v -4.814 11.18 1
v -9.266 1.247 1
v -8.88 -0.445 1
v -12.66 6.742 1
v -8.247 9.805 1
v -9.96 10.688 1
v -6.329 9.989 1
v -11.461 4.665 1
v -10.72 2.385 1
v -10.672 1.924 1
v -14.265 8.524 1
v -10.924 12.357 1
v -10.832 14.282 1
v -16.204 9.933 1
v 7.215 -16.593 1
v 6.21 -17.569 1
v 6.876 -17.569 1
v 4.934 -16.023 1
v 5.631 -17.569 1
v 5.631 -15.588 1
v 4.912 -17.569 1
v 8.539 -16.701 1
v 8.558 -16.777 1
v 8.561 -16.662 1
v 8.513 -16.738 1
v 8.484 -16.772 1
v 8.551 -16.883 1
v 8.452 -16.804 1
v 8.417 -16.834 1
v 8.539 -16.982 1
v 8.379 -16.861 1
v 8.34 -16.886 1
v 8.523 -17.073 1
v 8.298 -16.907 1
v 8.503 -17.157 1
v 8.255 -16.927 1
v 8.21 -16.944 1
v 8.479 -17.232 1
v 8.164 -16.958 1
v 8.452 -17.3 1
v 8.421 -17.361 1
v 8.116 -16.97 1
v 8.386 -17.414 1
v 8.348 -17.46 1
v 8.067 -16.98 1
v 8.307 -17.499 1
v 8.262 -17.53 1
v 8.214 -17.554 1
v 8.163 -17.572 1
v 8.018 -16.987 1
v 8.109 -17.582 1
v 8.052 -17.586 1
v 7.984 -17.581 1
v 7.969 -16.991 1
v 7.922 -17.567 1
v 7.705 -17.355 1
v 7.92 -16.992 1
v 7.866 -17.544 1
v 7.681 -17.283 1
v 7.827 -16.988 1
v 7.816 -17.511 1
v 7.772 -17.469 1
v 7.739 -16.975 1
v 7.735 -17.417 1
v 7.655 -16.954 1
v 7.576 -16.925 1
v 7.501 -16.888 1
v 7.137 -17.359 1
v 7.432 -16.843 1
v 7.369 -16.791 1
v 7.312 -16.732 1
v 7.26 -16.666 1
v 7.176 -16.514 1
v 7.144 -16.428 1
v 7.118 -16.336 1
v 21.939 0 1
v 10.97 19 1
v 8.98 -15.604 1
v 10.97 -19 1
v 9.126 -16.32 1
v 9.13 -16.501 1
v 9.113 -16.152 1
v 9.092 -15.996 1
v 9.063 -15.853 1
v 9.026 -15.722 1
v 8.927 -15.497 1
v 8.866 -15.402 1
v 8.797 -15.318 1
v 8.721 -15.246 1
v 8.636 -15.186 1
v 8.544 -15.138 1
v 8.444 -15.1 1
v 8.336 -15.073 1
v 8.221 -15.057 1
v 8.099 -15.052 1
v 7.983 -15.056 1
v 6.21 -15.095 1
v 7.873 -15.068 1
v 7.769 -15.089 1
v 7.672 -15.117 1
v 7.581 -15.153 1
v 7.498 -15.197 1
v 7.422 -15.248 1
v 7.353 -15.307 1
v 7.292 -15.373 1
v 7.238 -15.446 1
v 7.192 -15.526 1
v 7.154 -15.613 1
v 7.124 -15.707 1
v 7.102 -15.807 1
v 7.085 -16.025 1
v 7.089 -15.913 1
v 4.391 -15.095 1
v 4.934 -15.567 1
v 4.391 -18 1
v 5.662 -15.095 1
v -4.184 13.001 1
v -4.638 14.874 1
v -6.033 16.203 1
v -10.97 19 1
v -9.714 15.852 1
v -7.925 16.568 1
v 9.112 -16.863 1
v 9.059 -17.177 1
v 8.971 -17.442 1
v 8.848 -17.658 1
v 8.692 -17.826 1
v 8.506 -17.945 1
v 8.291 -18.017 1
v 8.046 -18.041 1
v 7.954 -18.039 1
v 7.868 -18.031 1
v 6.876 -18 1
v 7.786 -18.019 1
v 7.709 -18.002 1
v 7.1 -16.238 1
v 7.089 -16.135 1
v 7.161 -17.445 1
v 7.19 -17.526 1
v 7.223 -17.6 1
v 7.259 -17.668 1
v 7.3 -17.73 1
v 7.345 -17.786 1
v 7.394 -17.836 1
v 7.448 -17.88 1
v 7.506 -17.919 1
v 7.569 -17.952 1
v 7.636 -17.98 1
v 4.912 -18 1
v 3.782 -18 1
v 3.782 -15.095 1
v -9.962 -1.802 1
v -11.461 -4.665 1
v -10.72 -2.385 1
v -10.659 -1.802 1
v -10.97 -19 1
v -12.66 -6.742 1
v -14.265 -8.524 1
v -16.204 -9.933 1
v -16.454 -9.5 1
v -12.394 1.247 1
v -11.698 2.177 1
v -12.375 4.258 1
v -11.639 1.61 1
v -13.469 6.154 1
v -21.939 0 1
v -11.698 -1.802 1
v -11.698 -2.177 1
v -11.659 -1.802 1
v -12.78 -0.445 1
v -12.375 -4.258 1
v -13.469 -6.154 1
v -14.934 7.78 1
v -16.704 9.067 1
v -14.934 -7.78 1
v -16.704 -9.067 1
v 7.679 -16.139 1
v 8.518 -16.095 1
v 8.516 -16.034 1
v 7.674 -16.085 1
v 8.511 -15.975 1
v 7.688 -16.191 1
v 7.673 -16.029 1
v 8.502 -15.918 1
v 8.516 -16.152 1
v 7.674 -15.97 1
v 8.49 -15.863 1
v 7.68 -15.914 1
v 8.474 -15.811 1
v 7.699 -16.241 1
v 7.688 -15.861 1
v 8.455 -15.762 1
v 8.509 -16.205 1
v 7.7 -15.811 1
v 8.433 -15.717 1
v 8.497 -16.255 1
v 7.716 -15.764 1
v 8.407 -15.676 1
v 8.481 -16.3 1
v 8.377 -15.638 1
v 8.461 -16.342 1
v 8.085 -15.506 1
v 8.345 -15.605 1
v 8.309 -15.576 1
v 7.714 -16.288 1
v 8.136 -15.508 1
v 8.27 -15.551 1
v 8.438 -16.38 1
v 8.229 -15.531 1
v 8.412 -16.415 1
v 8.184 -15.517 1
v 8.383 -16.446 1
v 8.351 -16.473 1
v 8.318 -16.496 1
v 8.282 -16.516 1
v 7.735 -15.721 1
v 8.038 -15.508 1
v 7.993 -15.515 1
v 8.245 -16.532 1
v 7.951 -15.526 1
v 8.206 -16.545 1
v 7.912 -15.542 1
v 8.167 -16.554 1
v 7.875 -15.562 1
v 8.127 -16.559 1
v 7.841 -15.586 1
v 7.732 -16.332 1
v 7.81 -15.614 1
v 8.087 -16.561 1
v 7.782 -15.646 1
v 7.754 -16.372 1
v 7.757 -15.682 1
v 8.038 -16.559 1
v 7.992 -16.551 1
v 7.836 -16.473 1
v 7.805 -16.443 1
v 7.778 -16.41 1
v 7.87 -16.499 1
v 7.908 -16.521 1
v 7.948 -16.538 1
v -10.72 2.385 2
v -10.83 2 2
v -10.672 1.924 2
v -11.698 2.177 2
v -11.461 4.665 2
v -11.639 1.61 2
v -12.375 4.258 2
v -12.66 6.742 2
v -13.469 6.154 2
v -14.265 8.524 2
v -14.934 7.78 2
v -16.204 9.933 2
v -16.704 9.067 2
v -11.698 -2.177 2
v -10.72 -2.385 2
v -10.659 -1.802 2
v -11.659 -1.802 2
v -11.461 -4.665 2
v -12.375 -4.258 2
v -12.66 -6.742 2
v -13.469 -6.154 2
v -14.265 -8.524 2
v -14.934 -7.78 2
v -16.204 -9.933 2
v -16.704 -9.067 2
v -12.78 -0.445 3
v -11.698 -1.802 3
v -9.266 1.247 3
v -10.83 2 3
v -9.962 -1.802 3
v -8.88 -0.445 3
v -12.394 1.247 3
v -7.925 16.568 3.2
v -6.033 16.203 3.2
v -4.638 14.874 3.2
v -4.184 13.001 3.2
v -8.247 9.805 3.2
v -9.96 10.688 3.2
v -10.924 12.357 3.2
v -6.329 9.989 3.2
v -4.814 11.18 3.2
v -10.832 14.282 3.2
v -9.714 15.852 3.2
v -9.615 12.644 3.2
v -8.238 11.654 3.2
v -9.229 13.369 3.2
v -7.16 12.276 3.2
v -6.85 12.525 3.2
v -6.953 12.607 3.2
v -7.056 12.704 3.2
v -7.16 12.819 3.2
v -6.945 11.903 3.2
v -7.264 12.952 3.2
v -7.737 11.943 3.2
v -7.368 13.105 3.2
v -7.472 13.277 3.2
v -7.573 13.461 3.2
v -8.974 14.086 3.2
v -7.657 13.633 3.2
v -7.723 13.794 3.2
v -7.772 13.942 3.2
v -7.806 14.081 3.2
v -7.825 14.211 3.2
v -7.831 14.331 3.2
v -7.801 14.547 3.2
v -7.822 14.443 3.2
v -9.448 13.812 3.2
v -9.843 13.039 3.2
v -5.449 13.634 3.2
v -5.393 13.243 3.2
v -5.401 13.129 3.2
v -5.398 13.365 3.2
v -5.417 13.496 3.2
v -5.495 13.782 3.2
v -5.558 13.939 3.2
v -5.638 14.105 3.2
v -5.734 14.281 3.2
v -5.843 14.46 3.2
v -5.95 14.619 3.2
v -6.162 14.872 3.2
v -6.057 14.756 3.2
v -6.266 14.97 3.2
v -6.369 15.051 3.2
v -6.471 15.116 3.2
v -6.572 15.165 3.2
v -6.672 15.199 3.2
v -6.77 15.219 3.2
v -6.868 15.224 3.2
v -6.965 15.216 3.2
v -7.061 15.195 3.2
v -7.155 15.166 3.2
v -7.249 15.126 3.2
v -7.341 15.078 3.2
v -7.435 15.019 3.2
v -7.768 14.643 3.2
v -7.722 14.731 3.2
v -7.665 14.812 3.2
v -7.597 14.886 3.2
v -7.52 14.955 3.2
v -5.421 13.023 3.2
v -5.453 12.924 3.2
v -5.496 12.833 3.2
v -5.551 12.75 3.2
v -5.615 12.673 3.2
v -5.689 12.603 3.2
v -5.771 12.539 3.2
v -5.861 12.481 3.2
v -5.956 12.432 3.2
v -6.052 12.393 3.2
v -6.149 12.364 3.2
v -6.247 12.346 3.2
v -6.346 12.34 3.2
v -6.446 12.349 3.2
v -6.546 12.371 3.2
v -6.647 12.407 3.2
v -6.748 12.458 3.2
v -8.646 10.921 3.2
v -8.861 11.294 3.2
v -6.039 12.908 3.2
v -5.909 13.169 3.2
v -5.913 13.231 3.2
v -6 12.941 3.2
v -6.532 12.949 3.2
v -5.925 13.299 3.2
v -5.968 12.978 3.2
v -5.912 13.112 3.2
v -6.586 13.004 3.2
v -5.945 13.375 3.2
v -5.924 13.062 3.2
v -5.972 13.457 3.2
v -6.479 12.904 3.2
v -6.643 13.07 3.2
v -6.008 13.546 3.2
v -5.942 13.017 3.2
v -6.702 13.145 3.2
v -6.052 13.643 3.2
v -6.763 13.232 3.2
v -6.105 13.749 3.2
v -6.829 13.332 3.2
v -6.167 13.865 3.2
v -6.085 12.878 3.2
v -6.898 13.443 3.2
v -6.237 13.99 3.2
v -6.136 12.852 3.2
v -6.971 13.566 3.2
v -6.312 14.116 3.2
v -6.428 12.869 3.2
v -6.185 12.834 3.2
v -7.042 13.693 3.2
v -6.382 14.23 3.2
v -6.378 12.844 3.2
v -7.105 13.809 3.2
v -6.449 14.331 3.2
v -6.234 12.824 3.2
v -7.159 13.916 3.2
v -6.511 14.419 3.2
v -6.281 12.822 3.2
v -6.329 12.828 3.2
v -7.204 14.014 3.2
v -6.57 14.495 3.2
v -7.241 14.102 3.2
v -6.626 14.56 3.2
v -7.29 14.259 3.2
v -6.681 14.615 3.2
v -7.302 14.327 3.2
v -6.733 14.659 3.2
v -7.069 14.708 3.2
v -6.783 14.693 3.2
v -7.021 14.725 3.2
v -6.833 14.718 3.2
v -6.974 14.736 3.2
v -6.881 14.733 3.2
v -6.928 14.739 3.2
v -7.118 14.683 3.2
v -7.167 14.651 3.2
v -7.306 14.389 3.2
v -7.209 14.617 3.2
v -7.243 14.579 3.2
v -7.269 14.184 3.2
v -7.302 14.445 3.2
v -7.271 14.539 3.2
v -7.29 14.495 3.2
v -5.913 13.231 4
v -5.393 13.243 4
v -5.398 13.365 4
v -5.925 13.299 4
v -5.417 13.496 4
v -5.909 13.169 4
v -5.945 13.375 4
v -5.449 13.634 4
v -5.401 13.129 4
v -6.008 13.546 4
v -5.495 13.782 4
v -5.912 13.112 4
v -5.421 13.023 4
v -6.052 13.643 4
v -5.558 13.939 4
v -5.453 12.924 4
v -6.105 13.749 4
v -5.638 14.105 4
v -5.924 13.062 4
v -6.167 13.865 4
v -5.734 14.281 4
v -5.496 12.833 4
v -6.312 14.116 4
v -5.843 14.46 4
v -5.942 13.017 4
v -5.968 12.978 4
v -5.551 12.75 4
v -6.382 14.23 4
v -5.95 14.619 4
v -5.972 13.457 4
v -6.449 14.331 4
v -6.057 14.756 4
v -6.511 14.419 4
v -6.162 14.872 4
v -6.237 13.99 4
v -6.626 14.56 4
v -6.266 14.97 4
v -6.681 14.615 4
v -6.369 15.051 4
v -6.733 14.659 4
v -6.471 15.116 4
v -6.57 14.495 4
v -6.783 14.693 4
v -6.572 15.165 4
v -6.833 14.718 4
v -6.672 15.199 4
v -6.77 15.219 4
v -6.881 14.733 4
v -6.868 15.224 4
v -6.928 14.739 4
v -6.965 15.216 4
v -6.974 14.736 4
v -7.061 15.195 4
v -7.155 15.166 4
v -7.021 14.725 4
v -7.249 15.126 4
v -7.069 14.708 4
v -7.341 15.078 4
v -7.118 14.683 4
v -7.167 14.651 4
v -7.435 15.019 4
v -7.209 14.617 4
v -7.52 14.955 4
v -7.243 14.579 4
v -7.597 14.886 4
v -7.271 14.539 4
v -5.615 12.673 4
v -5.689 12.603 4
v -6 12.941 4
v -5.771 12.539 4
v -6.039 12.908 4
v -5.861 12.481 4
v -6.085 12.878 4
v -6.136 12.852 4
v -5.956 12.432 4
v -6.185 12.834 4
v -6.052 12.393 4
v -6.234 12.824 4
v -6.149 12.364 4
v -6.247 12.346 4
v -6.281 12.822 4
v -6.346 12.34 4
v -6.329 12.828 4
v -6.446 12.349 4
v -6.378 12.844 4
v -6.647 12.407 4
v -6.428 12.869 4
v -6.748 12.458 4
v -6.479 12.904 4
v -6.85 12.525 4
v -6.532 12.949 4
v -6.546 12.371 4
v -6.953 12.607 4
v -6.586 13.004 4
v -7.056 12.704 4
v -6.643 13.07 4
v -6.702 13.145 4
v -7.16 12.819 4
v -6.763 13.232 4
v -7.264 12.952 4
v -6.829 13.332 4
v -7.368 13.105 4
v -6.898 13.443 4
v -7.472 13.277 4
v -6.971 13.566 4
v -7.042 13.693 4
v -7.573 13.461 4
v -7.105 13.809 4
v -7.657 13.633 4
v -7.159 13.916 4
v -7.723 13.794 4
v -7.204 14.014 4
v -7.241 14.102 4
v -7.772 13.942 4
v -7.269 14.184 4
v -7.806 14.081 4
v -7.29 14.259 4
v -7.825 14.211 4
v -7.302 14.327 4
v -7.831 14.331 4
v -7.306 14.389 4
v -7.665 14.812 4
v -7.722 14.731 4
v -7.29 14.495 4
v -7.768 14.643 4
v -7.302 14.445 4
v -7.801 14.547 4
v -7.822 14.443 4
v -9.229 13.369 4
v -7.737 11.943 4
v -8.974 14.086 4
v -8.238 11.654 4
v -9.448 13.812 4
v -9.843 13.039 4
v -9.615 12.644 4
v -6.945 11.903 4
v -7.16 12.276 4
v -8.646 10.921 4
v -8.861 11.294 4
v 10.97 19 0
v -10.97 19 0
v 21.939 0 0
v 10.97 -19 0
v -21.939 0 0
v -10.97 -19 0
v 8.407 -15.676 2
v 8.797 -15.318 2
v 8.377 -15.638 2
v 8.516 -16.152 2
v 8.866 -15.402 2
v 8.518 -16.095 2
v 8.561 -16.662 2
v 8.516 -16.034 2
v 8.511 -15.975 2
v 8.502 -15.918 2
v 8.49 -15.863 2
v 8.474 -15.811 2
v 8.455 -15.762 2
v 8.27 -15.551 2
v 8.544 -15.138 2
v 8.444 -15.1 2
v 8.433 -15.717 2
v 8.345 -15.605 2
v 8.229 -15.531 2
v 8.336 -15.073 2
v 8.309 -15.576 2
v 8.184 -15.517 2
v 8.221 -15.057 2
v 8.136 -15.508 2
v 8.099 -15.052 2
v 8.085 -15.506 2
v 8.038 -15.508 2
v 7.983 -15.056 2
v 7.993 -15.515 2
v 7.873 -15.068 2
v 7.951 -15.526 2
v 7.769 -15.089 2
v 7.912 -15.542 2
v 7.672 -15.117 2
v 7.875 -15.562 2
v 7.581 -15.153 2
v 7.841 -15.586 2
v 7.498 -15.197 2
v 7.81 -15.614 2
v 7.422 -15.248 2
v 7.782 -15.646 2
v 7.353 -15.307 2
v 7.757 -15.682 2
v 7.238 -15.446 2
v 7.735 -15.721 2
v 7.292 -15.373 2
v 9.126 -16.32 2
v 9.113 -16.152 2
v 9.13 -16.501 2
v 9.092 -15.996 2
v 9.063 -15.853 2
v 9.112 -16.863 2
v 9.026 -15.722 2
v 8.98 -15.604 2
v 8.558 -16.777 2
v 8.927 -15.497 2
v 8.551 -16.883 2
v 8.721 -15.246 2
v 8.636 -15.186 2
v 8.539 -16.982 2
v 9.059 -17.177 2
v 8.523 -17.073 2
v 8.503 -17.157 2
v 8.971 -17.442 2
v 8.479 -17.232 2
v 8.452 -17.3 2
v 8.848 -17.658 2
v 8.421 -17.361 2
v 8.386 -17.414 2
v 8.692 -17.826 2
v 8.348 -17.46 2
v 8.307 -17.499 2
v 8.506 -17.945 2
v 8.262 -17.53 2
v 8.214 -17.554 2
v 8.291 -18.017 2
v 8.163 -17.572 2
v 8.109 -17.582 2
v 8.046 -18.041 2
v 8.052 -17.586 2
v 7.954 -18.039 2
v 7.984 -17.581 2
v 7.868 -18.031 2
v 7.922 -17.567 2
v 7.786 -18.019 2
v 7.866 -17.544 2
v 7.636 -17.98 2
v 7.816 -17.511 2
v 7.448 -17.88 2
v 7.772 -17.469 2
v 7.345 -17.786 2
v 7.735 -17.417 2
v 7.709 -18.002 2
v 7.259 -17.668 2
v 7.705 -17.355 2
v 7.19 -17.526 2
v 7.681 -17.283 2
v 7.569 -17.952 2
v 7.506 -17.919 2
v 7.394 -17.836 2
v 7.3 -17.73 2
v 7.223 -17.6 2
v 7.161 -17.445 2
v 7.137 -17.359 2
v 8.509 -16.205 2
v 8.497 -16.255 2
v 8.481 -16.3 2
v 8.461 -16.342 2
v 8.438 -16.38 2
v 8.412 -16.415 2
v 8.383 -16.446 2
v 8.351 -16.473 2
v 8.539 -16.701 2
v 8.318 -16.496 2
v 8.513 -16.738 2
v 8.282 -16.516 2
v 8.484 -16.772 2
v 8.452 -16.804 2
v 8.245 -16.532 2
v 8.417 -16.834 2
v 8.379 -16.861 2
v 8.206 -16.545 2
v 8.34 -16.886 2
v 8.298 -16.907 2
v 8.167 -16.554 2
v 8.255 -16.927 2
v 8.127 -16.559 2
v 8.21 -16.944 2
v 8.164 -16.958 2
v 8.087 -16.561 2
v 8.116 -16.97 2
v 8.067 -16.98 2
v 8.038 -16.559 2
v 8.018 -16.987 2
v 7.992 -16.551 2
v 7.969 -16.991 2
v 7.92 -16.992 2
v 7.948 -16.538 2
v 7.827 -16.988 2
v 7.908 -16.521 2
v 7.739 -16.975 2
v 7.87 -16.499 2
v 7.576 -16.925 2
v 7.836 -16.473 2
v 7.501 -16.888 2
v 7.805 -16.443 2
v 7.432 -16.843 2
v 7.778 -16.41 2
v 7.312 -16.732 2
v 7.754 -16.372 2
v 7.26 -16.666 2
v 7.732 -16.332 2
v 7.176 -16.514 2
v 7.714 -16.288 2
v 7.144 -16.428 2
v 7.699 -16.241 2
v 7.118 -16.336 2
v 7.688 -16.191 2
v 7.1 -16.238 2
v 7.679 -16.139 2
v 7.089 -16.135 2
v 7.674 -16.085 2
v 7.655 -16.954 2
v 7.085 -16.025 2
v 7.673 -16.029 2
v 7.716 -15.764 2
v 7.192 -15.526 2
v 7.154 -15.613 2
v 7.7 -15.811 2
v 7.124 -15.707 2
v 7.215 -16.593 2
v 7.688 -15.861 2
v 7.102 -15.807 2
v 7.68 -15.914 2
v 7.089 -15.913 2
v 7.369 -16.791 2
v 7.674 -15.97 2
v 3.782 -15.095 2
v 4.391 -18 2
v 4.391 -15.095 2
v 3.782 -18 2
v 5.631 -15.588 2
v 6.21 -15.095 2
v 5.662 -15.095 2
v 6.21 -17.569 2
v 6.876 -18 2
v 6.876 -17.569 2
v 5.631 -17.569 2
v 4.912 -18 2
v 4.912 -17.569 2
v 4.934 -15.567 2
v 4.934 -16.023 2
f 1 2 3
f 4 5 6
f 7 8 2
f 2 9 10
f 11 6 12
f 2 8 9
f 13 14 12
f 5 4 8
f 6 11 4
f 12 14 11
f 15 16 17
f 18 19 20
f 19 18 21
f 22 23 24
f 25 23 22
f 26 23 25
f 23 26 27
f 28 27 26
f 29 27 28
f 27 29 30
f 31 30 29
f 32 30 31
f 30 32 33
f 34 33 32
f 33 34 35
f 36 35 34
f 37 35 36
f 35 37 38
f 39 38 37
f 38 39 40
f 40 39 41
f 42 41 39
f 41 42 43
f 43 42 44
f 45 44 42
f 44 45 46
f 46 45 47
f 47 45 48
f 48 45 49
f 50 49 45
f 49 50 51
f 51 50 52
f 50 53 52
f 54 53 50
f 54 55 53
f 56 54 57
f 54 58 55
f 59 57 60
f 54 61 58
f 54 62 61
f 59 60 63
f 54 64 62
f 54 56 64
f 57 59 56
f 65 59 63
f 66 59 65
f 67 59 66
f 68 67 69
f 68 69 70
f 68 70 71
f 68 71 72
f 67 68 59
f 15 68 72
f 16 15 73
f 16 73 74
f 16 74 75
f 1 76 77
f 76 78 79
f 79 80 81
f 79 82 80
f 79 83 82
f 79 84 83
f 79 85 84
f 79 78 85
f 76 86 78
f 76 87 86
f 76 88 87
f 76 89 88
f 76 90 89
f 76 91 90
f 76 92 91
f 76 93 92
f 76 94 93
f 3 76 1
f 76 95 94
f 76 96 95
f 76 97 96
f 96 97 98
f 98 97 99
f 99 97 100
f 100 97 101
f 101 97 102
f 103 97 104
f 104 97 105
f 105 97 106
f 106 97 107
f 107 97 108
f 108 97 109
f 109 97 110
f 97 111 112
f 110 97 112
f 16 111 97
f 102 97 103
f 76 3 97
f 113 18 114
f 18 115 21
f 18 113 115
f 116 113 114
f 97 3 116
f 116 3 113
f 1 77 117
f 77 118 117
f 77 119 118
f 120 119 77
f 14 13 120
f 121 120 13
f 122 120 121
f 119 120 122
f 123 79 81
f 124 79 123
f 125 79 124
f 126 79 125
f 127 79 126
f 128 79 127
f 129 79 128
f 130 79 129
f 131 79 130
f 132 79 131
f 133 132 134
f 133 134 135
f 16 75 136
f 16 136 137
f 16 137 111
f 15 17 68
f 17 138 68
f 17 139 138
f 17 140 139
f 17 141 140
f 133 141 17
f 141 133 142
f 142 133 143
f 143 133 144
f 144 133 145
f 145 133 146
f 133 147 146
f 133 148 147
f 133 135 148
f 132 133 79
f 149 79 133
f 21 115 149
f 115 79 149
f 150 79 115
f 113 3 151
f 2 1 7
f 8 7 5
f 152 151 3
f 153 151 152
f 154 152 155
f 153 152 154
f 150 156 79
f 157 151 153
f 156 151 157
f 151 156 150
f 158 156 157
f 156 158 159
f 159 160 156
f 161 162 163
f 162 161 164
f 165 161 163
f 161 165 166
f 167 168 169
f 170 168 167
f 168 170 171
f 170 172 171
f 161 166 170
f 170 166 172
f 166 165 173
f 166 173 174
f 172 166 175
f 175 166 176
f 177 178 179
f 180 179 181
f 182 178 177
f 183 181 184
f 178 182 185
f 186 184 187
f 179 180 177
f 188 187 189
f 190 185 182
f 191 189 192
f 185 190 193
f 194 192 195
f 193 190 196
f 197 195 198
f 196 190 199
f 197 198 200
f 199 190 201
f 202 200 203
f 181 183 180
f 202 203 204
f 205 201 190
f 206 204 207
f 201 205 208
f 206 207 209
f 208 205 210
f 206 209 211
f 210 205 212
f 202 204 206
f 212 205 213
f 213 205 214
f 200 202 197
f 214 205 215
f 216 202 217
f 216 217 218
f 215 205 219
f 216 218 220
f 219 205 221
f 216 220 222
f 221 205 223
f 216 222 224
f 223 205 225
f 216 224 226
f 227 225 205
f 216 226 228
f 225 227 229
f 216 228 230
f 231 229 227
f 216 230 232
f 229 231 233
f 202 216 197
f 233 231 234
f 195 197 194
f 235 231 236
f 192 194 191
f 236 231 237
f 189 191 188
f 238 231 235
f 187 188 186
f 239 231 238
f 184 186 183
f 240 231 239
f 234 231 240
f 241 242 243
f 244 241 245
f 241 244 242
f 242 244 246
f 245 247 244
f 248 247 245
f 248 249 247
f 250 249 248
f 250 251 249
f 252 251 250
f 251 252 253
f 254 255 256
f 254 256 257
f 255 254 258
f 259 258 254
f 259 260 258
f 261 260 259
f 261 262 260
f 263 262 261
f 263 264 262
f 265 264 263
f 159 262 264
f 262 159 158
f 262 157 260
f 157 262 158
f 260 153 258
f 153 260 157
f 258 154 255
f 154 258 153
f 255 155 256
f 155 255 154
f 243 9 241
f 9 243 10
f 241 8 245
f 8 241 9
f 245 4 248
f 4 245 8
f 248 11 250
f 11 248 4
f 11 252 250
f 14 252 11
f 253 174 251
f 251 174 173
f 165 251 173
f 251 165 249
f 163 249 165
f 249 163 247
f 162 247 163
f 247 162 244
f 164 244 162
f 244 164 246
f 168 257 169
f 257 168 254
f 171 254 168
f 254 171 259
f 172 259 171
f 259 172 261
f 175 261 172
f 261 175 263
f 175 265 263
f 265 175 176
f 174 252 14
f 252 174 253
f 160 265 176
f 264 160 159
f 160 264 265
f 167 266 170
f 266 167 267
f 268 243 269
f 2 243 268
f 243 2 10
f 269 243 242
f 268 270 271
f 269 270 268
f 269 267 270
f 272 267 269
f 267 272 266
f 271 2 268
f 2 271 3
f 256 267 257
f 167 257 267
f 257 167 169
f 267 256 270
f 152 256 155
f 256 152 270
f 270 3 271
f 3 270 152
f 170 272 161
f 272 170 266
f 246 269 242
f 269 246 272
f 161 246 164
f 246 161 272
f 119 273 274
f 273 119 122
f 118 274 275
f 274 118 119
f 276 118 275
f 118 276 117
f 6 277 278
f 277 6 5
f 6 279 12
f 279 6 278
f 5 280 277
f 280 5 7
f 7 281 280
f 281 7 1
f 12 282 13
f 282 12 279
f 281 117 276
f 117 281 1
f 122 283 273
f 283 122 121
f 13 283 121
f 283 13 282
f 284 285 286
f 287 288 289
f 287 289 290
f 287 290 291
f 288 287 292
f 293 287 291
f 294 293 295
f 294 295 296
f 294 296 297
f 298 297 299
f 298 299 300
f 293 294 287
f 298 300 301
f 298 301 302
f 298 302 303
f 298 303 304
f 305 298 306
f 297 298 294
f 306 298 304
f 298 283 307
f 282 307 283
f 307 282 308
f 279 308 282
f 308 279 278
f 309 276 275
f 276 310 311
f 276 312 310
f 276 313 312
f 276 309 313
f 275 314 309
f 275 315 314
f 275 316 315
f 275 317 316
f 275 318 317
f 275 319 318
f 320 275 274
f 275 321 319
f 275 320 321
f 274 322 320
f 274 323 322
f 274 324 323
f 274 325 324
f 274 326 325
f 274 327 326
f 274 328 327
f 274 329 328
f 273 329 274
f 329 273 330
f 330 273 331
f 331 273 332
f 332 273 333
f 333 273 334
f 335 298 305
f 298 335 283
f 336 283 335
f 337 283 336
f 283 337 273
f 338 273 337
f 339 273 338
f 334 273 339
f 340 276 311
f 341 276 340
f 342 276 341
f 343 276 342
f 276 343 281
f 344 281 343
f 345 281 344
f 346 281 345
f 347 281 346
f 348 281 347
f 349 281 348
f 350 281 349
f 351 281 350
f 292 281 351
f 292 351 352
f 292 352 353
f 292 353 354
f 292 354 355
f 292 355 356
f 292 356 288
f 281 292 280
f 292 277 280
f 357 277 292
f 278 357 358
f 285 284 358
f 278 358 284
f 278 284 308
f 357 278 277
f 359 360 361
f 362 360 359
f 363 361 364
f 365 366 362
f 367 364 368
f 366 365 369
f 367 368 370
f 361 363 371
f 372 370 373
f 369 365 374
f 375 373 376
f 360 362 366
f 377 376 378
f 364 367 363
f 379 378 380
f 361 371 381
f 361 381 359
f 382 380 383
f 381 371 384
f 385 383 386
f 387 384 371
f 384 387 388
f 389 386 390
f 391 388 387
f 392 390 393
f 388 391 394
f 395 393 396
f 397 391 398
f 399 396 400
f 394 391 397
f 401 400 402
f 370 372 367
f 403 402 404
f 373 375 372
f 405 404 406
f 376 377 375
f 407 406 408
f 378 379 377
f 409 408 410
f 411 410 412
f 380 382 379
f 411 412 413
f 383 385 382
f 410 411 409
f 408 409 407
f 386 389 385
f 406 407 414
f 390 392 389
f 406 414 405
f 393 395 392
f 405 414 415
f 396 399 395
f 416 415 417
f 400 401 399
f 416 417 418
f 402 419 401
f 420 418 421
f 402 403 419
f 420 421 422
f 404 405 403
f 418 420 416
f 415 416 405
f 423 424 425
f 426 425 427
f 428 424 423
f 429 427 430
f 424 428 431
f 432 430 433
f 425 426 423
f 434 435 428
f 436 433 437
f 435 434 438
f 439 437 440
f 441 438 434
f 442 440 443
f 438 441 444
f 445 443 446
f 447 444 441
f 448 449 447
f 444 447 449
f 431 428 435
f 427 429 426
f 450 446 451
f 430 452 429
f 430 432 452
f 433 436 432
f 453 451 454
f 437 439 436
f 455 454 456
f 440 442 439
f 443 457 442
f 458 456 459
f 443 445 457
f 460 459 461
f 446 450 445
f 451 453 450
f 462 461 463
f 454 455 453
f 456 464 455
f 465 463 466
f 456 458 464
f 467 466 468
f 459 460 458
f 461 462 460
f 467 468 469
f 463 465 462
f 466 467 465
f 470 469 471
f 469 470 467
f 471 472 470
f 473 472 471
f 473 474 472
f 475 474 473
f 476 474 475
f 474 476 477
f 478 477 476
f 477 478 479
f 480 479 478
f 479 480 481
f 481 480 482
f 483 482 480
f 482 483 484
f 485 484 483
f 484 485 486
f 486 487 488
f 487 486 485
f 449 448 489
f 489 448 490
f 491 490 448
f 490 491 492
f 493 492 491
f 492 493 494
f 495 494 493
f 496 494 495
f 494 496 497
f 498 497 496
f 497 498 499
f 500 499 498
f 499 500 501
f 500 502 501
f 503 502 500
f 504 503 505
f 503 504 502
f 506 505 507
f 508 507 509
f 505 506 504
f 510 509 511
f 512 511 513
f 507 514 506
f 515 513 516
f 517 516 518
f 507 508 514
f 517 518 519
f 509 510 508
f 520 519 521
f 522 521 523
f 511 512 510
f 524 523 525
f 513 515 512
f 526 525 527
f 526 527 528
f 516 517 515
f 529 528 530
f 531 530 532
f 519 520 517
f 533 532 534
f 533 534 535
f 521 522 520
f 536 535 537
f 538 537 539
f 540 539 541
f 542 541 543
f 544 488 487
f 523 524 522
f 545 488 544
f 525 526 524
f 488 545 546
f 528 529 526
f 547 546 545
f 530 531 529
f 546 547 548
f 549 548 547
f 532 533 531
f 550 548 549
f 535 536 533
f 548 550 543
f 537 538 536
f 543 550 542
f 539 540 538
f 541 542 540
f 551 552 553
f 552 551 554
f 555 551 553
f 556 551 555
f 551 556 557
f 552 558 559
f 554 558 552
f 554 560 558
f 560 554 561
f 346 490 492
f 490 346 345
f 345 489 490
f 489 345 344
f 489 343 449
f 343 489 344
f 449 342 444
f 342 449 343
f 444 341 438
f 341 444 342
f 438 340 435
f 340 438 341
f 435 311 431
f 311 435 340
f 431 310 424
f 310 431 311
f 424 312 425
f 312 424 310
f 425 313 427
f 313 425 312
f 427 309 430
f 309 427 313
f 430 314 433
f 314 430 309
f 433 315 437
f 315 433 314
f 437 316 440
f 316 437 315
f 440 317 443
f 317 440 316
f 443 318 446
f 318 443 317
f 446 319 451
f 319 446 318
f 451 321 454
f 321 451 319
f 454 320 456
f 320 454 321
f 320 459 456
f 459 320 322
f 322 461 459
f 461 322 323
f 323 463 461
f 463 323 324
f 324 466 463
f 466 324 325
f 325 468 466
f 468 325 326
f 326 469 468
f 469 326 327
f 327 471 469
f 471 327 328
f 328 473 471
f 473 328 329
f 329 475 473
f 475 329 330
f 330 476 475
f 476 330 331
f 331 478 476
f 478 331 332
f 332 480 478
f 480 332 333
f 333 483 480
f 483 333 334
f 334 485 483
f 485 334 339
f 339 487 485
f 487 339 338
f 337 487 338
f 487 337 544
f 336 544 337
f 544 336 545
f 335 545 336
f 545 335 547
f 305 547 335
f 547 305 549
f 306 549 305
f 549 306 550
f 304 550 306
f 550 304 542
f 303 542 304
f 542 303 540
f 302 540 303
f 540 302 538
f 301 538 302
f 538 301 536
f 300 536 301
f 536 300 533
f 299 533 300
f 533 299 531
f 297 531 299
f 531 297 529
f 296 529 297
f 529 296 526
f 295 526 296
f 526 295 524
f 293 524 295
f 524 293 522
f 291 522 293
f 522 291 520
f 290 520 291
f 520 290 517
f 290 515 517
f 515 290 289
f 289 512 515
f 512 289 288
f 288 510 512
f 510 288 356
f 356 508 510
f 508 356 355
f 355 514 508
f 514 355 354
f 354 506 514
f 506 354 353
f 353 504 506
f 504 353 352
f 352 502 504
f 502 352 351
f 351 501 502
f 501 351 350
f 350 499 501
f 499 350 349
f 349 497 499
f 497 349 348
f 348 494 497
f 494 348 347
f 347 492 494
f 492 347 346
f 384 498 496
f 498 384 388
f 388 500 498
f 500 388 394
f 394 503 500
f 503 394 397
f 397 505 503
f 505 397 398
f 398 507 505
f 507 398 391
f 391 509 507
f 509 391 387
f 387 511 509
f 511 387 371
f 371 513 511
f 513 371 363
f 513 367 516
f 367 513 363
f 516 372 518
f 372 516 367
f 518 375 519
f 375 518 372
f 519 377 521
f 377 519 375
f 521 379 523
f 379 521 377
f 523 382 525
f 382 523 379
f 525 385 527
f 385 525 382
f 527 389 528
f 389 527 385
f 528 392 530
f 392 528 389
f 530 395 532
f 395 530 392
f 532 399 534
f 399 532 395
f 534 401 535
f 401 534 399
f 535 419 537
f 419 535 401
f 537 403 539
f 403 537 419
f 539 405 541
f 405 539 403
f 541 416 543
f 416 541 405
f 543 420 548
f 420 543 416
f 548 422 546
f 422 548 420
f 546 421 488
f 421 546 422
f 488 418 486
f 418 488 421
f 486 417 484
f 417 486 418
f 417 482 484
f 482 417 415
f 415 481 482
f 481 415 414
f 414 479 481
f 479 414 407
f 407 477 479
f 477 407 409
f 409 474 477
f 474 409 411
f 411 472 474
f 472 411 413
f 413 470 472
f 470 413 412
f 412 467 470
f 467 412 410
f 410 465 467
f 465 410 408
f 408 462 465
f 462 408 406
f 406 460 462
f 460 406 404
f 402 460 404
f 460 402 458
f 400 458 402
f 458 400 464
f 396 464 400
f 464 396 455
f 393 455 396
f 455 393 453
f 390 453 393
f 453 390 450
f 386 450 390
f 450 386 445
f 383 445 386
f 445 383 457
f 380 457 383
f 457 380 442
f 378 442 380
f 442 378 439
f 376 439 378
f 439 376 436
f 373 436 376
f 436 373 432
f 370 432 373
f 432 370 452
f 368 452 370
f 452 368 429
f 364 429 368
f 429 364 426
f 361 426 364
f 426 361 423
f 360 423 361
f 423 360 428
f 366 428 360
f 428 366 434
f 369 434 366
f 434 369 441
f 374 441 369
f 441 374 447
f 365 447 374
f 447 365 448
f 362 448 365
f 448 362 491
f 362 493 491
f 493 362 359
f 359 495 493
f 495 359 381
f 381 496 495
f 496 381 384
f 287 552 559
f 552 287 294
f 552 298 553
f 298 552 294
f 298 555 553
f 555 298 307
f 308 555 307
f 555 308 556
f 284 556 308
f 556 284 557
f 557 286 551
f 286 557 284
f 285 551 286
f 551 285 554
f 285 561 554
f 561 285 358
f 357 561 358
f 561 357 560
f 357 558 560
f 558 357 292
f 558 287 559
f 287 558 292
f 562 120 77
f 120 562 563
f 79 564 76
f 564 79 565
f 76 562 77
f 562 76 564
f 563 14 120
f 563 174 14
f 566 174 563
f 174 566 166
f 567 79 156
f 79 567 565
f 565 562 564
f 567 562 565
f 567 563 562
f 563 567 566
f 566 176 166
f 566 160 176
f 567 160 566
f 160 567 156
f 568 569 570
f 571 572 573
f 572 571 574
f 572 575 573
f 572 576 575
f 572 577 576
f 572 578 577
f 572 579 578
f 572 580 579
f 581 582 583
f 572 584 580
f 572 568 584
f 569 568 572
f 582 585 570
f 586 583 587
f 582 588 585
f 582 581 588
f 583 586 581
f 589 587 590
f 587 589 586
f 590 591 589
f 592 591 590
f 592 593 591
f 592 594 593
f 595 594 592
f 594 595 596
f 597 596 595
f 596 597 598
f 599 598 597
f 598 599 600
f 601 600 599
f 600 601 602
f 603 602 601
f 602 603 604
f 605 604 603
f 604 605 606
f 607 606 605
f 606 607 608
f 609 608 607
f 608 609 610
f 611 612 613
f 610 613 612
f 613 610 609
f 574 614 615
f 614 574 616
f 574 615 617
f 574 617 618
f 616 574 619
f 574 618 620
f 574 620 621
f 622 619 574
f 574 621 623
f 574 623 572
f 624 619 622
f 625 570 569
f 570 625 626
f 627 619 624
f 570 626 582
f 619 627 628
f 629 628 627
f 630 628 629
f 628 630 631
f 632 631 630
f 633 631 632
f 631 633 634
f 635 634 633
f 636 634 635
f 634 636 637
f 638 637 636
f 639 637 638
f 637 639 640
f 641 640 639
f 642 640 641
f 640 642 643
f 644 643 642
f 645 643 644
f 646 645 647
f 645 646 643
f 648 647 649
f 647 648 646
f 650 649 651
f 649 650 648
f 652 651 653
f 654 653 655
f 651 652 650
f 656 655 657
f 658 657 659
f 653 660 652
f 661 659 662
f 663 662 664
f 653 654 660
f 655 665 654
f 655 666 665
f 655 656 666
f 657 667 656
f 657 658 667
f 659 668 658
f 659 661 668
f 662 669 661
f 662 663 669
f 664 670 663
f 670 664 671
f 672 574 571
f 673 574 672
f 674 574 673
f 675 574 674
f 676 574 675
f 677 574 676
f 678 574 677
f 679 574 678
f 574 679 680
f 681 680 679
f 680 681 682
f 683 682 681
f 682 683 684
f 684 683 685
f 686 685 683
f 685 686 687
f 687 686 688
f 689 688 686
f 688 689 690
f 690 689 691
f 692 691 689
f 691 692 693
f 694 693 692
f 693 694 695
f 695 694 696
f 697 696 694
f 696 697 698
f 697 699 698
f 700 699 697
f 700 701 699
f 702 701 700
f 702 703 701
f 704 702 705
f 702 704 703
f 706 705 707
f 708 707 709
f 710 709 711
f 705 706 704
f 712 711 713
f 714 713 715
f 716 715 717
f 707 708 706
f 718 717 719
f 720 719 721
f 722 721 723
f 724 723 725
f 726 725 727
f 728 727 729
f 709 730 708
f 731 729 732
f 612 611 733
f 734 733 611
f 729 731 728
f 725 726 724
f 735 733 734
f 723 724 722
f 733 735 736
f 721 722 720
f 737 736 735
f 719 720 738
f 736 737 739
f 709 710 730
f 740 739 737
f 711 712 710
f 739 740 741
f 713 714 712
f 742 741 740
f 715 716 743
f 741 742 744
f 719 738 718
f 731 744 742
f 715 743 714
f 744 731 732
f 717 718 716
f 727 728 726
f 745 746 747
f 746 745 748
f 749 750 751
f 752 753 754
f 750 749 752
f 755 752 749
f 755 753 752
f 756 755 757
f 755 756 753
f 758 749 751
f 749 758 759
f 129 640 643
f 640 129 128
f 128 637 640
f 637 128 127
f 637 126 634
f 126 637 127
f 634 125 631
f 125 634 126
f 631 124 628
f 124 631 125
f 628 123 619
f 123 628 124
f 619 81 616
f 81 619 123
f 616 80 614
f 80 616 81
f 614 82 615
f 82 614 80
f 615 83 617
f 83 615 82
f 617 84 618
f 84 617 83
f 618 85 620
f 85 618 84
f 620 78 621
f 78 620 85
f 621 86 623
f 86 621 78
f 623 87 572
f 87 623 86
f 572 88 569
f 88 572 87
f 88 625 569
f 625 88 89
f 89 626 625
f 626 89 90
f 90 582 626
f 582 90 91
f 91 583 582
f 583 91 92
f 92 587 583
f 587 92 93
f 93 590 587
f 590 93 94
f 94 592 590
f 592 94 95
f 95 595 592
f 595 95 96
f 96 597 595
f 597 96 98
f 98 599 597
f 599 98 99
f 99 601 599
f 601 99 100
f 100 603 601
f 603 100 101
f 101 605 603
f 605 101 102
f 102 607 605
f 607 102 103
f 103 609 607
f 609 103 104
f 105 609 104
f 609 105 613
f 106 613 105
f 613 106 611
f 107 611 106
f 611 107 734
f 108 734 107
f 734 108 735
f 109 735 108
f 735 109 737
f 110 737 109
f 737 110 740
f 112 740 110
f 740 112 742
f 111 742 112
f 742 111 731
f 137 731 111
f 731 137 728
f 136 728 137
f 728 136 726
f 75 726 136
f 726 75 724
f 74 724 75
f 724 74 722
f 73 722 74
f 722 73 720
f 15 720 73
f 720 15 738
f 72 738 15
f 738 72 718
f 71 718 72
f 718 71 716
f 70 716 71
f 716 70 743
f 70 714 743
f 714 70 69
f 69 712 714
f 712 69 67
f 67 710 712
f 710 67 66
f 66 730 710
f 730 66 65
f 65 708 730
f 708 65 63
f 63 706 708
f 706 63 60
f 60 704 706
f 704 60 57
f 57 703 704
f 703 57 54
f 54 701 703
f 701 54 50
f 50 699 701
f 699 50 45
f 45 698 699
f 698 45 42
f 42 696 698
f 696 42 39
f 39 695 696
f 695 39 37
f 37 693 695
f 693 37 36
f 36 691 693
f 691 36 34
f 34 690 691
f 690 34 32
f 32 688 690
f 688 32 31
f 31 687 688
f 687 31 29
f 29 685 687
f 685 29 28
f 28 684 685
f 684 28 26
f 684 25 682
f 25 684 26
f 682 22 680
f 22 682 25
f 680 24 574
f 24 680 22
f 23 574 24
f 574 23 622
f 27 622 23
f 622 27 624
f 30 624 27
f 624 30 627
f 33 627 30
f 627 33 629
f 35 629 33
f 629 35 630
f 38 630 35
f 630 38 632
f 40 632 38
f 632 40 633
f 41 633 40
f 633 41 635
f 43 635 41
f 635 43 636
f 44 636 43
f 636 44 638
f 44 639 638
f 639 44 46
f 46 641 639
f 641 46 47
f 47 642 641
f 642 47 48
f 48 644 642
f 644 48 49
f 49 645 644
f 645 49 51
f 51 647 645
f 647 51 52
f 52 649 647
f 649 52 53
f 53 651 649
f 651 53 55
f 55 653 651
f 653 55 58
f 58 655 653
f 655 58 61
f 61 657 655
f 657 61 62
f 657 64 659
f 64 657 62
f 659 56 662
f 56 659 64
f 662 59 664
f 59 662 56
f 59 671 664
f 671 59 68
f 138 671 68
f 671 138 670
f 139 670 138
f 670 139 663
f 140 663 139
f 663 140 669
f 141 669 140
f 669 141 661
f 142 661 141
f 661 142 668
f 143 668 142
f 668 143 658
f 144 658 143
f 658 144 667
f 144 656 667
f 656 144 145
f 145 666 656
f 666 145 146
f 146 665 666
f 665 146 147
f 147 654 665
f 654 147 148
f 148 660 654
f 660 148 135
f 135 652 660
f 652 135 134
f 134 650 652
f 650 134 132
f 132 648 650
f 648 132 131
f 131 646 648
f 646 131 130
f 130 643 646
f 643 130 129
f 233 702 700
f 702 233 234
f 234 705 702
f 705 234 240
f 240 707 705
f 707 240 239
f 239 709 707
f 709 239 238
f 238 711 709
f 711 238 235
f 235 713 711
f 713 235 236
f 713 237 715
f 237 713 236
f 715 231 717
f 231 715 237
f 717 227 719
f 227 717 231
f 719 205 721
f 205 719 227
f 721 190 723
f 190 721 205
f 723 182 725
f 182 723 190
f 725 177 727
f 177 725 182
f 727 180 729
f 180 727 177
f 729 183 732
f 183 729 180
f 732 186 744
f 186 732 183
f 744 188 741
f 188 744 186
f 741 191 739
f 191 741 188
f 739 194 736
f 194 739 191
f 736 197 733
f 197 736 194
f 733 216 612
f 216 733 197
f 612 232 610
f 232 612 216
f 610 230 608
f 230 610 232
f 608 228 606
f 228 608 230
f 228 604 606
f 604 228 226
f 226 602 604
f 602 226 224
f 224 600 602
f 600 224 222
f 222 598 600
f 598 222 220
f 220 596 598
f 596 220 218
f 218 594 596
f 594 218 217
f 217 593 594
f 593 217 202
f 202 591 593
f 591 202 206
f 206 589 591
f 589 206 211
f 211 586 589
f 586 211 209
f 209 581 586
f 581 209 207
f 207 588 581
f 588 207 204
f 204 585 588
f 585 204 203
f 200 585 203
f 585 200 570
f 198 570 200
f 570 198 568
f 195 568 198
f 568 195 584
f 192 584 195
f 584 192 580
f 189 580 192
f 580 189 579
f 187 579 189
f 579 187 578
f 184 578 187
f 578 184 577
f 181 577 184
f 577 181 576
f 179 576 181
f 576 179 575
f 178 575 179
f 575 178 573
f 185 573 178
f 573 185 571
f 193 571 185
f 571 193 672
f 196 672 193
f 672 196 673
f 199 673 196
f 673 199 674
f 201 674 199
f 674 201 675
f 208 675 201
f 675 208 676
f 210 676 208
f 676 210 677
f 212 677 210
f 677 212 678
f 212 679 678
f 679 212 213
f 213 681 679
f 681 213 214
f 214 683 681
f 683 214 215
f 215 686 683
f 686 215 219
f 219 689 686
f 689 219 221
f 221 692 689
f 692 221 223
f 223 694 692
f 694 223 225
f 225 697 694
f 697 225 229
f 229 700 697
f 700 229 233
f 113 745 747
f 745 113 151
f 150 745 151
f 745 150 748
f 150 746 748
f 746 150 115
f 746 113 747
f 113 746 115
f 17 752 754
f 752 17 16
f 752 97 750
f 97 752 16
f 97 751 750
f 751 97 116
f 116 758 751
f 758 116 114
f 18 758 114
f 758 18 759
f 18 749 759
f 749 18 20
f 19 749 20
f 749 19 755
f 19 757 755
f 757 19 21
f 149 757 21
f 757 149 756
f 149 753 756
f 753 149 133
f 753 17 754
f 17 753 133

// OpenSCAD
include <../../Scripts/18xx tiles basic functions.scad>
hex("Blue");
small_town_sharp_curve(4);
put_tilenr("I19");
put_value_blue("10",-30);
